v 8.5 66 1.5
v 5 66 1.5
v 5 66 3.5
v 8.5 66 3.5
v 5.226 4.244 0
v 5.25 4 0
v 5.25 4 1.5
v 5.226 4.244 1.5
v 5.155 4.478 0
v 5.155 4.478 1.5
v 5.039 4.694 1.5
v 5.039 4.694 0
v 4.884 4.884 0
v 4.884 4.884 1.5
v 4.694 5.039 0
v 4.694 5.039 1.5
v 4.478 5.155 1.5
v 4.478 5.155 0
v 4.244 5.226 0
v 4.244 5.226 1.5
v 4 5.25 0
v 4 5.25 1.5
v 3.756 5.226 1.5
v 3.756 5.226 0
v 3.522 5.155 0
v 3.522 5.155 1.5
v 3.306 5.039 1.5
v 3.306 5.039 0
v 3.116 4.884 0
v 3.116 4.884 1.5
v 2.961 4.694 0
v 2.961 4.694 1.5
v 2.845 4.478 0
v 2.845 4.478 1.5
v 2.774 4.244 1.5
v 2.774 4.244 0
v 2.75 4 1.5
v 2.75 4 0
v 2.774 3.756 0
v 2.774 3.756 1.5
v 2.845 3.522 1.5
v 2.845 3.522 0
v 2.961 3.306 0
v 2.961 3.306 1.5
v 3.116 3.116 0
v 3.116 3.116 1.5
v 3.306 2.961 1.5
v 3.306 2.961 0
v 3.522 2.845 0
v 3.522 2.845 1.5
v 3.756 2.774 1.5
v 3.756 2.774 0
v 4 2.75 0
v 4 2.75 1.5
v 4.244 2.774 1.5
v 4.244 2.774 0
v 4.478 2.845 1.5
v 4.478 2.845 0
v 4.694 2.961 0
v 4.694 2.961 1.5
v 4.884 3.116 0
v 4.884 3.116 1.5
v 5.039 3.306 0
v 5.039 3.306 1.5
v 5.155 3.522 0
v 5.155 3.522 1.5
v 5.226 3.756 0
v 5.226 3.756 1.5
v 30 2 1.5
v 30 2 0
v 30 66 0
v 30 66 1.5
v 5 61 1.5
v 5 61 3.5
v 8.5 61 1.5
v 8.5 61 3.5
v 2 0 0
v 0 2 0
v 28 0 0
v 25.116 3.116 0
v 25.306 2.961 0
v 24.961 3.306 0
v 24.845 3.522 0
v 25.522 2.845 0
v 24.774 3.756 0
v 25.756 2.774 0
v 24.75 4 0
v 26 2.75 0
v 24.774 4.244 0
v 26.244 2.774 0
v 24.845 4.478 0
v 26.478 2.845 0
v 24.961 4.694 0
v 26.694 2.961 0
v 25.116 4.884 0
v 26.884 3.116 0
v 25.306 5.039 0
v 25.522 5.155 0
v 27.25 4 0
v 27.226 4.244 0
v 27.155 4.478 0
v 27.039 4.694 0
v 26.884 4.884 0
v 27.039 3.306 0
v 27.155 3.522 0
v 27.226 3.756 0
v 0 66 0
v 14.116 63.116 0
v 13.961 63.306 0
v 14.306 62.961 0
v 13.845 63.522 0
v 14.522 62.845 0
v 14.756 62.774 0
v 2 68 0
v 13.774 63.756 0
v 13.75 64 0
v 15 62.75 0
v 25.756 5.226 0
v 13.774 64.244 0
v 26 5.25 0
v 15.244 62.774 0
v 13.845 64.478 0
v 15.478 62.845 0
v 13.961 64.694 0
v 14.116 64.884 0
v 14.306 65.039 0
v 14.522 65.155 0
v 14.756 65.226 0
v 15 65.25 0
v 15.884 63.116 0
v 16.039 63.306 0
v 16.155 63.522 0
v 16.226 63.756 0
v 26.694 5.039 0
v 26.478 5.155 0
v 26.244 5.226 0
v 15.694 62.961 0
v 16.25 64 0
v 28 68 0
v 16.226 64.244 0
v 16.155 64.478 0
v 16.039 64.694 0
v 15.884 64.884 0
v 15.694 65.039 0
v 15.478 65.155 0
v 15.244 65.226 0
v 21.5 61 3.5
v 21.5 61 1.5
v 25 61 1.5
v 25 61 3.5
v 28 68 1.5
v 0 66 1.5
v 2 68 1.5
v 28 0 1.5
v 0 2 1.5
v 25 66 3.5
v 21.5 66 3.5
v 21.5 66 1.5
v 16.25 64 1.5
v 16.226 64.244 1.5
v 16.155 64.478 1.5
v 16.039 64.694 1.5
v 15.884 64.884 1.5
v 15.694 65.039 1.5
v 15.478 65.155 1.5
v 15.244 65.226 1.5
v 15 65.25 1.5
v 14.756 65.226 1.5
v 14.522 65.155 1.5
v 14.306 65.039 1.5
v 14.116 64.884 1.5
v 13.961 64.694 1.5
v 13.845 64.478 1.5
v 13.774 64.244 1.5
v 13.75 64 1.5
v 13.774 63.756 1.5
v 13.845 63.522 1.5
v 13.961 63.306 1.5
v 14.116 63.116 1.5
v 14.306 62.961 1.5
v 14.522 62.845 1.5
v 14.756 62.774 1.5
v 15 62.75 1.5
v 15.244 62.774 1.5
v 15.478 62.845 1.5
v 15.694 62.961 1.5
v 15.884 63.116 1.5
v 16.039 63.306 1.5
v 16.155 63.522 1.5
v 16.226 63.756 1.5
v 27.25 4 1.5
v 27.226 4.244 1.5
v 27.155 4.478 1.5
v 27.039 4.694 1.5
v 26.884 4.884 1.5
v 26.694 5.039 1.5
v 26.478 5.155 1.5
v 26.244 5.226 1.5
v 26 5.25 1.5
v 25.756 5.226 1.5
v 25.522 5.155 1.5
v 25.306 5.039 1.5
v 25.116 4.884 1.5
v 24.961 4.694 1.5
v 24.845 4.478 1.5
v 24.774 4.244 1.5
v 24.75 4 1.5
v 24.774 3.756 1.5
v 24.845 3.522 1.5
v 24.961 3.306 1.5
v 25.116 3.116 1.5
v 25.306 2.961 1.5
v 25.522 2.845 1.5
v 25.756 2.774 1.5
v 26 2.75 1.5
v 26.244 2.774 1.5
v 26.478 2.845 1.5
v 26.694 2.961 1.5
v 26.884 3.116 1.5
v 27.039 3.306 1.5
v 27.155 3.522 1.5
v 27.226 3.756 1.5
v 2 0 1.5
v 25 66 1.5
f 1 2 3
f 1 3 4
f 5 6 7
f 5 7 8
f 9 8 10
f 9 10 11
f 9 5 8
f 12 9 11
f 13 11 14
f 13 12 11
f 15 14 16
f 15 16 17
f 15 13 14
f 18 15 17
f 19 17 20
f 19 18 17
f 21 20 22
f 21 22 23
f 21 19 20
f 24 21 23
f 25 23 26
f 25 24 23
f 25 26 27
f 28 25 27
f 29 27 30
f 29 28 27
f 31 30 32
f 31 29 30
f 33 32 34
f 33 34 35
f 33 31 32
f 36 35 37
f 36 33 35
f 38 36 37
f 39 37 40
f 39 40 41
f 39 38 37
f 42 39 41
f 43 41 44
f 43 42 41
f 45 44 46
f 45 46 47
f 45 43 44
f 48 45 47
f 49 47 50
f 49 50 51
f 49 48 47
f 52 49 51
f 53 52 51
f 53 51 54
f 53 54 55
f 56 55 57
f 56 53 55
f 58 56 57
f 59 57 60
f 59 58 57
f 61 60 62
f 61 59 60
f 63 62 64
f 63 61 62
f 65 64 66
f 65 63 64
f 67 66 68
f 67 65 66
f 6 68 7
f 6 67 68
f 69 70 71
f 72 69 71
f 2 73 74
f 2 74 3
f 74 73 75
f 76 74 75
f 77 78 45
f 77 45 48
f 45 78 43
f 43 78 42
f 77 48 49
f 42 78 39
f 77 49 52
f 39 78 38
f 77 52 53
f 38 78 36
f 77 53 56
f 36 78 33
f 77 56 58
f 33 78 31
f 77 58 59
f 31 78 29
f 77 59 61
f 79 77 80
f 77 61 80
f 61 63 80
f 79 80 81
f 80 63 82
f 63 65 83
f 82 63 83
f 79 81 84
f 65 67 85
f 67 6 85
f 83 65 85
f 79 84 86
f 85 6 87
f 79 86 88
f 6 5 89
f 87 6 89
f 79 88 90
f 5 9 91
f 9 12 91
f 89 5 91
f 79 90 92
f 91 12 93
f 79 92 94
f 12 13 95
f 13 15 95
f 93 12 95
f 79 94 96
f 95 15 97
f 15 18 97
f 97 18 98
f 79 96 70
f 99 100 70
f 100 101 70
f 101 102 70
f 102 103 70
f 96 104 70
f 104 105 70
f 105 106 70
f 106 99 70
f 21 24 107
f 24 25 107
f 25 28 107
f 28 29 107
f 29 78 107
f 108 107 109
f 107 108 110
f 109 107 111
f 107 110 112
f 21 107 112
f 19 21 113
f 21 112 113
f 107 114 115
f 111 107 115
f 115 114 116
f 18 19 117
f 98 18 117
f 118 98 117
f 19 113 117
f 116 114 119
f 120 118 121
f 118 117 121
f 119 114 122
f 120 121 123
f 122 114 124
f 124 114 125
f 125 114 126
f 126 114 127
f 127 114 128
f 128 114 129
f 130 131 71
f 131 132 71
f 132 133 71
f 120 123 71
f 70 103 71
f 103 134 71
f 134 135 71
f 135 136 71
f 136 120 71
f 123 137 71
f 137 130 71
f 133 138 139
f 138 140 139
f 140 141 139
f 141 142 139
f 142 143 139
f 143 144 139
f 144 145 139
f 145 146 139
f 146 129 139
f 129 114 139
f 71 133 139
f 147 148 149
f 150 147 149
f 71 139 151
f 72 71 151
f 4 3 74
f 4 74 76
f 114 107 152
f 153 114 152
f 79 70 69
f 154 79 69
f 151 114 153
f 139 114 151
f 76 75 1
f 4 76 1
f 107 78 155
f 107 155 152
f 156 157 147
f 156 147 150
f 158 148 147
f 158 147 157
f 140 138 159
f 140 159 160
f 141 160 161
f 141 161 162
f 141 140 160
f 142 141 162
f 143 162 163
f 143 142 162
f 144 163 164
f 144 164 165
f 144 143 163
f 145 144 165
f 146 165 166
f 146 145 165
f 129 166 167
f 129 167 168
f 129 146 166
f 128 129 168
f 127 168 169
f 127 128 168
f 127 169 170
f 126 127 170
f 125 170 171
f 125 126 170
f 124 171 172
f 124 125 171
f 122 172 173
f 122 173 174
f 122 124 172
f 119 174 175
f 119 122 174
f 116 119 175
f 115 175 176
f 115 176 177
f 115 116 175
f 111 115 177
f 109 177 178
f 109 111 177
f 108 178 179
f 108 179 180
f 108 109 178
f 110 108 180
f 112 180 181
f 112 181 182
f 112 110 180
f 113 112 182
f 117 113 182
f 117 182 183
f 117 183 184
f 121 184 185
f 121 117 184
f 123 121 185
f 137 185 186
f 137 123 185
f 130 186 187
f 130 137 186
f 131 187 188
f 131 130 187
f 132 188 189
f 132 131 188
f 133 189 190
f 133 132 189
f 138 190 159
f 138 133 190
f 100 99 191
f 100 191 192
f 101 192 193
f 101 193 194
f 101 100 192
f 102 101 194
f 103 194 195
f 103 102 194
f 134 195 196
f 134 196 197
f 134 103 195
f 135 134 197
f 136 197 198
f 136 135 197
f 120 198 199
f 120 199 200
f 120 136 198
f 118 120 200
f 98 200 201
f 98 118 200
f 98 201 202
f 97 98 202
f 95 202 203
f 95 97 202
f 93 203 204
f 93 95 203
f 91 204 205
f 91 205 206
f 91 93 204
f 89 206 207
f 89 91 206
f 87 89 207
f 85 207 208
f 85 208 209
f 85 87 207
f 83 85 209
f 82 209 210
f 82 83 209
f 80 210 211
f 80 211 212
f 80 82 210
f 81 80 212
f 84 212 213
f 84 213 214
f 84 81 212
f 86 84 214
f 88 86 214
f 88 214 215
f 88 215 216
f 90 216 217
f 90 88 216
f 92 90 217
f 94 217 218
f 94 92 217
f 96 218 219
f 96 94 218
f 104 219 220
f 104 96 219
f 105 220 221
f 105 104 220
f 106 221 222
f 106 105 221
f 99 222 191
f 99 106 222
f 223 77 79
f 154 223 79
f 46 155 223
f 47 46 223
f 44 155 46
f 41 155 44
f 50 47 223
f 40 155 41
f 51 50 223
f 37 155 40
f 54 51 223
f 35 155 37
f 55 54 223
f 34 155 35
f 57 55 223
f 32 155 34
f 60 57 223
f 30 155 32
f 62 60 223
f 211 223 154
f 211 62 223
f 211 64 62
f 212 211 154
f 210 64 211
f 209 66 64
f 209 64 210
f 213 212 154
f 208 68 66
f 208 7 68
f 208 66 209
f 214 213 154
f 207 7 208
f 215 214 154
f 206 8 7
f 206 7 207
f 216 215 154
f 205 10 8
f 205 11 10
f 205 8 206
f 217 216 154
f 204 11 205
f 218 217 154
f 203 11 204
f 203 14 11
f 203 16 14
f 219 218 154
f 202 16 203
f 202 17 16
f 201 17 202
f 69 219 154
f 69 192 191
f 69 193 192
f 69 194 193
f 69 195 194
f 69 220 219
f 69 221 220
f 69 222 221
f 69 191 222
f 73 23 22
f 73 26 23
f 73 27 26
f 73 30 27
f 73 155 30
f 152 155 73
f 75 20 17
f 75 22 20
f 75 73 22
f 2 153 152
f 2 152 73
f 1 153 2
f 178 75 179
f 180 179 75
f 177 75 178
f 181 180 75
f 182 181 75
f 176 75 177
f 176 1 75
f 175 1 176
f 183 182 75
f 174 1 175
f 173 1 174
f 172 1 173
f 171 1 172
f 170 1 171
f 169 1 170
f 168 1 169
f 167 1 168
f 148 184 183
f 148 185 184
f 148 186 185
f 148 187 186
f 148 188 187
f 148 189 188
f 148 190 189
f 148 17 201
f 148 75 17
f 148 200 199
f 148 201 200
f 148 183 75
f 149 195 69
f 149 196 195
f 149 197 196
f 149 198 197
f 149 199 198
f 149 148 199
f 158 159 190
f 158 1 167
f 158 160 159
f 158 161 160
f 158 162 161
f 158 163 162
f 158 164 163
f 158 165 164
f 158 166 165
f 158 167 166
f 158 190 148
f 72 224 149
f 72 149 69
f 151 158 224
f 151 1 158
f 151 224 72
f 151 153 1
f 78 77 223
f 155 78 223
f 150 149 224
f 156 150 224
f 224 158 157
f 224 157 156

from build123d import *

# Parameters (mm, degrees)
SKETCH_1_W      = 30
SKETCH_1_H      = 68
SKETCH_1_R      = 1.25
EXTRUDE_6_DEPTH = 1.5
CHAMFER_2_SIZE  = 2
SKETCH_9_W      = 3.5
SKETCH_9_H      = 5
EXTRUDE_7_DEPTH = 2


with BuildPart() as part:
    # Эскиз1 → Бобышка-Вытянуть6 (new body)
    with BuildSketch(Plane.XY):
        with Locations((15, 34)):
            Rectangle(SKETCH_1_W, SKETCH_1_H)
        with Locations((15, 64)):
            Circle(SKETCH_1_R, mode=Mode.SUBTRACT)
        with Locations((4, 4)):
            Circle(SKETCH_1_R, mode=Mode.SUBTRACT)
        with Locations((26, 4)):
            Circle(SKETCH_1_R, mode=Mode.SUBTRACT)
    extrude(amount=EXTRUDE_6_DEPTH)

    # Фаска2
    chamfer_2_edges = [part.edges().sort_by_distance(p)[0] for p in [
        (0, 68, 0.75),
        (30, 68, 0.75),
        (30, 0, 0.75),
        (0, 0, 0.75),
    ]]
    chamfer(chamfer_2_edges, length=CHAMFER_2_SIZE)

    # Эскиз9 → Бобышка-Вытянуть7 (add)
    with BuildSketch(Plane.XY.offset(1.5)):
        with Locations((6.75, 63.5)):
            Rectangle(SKETCH_9_W, SKETCH_9_H)
        with Locations((23.25, 63.5)):
            Rectangle(SKETCH_9_W, SKETCH_9_H)
    extrude(amount=EXTRUDE_7_DEPTH)


solid = part.part
